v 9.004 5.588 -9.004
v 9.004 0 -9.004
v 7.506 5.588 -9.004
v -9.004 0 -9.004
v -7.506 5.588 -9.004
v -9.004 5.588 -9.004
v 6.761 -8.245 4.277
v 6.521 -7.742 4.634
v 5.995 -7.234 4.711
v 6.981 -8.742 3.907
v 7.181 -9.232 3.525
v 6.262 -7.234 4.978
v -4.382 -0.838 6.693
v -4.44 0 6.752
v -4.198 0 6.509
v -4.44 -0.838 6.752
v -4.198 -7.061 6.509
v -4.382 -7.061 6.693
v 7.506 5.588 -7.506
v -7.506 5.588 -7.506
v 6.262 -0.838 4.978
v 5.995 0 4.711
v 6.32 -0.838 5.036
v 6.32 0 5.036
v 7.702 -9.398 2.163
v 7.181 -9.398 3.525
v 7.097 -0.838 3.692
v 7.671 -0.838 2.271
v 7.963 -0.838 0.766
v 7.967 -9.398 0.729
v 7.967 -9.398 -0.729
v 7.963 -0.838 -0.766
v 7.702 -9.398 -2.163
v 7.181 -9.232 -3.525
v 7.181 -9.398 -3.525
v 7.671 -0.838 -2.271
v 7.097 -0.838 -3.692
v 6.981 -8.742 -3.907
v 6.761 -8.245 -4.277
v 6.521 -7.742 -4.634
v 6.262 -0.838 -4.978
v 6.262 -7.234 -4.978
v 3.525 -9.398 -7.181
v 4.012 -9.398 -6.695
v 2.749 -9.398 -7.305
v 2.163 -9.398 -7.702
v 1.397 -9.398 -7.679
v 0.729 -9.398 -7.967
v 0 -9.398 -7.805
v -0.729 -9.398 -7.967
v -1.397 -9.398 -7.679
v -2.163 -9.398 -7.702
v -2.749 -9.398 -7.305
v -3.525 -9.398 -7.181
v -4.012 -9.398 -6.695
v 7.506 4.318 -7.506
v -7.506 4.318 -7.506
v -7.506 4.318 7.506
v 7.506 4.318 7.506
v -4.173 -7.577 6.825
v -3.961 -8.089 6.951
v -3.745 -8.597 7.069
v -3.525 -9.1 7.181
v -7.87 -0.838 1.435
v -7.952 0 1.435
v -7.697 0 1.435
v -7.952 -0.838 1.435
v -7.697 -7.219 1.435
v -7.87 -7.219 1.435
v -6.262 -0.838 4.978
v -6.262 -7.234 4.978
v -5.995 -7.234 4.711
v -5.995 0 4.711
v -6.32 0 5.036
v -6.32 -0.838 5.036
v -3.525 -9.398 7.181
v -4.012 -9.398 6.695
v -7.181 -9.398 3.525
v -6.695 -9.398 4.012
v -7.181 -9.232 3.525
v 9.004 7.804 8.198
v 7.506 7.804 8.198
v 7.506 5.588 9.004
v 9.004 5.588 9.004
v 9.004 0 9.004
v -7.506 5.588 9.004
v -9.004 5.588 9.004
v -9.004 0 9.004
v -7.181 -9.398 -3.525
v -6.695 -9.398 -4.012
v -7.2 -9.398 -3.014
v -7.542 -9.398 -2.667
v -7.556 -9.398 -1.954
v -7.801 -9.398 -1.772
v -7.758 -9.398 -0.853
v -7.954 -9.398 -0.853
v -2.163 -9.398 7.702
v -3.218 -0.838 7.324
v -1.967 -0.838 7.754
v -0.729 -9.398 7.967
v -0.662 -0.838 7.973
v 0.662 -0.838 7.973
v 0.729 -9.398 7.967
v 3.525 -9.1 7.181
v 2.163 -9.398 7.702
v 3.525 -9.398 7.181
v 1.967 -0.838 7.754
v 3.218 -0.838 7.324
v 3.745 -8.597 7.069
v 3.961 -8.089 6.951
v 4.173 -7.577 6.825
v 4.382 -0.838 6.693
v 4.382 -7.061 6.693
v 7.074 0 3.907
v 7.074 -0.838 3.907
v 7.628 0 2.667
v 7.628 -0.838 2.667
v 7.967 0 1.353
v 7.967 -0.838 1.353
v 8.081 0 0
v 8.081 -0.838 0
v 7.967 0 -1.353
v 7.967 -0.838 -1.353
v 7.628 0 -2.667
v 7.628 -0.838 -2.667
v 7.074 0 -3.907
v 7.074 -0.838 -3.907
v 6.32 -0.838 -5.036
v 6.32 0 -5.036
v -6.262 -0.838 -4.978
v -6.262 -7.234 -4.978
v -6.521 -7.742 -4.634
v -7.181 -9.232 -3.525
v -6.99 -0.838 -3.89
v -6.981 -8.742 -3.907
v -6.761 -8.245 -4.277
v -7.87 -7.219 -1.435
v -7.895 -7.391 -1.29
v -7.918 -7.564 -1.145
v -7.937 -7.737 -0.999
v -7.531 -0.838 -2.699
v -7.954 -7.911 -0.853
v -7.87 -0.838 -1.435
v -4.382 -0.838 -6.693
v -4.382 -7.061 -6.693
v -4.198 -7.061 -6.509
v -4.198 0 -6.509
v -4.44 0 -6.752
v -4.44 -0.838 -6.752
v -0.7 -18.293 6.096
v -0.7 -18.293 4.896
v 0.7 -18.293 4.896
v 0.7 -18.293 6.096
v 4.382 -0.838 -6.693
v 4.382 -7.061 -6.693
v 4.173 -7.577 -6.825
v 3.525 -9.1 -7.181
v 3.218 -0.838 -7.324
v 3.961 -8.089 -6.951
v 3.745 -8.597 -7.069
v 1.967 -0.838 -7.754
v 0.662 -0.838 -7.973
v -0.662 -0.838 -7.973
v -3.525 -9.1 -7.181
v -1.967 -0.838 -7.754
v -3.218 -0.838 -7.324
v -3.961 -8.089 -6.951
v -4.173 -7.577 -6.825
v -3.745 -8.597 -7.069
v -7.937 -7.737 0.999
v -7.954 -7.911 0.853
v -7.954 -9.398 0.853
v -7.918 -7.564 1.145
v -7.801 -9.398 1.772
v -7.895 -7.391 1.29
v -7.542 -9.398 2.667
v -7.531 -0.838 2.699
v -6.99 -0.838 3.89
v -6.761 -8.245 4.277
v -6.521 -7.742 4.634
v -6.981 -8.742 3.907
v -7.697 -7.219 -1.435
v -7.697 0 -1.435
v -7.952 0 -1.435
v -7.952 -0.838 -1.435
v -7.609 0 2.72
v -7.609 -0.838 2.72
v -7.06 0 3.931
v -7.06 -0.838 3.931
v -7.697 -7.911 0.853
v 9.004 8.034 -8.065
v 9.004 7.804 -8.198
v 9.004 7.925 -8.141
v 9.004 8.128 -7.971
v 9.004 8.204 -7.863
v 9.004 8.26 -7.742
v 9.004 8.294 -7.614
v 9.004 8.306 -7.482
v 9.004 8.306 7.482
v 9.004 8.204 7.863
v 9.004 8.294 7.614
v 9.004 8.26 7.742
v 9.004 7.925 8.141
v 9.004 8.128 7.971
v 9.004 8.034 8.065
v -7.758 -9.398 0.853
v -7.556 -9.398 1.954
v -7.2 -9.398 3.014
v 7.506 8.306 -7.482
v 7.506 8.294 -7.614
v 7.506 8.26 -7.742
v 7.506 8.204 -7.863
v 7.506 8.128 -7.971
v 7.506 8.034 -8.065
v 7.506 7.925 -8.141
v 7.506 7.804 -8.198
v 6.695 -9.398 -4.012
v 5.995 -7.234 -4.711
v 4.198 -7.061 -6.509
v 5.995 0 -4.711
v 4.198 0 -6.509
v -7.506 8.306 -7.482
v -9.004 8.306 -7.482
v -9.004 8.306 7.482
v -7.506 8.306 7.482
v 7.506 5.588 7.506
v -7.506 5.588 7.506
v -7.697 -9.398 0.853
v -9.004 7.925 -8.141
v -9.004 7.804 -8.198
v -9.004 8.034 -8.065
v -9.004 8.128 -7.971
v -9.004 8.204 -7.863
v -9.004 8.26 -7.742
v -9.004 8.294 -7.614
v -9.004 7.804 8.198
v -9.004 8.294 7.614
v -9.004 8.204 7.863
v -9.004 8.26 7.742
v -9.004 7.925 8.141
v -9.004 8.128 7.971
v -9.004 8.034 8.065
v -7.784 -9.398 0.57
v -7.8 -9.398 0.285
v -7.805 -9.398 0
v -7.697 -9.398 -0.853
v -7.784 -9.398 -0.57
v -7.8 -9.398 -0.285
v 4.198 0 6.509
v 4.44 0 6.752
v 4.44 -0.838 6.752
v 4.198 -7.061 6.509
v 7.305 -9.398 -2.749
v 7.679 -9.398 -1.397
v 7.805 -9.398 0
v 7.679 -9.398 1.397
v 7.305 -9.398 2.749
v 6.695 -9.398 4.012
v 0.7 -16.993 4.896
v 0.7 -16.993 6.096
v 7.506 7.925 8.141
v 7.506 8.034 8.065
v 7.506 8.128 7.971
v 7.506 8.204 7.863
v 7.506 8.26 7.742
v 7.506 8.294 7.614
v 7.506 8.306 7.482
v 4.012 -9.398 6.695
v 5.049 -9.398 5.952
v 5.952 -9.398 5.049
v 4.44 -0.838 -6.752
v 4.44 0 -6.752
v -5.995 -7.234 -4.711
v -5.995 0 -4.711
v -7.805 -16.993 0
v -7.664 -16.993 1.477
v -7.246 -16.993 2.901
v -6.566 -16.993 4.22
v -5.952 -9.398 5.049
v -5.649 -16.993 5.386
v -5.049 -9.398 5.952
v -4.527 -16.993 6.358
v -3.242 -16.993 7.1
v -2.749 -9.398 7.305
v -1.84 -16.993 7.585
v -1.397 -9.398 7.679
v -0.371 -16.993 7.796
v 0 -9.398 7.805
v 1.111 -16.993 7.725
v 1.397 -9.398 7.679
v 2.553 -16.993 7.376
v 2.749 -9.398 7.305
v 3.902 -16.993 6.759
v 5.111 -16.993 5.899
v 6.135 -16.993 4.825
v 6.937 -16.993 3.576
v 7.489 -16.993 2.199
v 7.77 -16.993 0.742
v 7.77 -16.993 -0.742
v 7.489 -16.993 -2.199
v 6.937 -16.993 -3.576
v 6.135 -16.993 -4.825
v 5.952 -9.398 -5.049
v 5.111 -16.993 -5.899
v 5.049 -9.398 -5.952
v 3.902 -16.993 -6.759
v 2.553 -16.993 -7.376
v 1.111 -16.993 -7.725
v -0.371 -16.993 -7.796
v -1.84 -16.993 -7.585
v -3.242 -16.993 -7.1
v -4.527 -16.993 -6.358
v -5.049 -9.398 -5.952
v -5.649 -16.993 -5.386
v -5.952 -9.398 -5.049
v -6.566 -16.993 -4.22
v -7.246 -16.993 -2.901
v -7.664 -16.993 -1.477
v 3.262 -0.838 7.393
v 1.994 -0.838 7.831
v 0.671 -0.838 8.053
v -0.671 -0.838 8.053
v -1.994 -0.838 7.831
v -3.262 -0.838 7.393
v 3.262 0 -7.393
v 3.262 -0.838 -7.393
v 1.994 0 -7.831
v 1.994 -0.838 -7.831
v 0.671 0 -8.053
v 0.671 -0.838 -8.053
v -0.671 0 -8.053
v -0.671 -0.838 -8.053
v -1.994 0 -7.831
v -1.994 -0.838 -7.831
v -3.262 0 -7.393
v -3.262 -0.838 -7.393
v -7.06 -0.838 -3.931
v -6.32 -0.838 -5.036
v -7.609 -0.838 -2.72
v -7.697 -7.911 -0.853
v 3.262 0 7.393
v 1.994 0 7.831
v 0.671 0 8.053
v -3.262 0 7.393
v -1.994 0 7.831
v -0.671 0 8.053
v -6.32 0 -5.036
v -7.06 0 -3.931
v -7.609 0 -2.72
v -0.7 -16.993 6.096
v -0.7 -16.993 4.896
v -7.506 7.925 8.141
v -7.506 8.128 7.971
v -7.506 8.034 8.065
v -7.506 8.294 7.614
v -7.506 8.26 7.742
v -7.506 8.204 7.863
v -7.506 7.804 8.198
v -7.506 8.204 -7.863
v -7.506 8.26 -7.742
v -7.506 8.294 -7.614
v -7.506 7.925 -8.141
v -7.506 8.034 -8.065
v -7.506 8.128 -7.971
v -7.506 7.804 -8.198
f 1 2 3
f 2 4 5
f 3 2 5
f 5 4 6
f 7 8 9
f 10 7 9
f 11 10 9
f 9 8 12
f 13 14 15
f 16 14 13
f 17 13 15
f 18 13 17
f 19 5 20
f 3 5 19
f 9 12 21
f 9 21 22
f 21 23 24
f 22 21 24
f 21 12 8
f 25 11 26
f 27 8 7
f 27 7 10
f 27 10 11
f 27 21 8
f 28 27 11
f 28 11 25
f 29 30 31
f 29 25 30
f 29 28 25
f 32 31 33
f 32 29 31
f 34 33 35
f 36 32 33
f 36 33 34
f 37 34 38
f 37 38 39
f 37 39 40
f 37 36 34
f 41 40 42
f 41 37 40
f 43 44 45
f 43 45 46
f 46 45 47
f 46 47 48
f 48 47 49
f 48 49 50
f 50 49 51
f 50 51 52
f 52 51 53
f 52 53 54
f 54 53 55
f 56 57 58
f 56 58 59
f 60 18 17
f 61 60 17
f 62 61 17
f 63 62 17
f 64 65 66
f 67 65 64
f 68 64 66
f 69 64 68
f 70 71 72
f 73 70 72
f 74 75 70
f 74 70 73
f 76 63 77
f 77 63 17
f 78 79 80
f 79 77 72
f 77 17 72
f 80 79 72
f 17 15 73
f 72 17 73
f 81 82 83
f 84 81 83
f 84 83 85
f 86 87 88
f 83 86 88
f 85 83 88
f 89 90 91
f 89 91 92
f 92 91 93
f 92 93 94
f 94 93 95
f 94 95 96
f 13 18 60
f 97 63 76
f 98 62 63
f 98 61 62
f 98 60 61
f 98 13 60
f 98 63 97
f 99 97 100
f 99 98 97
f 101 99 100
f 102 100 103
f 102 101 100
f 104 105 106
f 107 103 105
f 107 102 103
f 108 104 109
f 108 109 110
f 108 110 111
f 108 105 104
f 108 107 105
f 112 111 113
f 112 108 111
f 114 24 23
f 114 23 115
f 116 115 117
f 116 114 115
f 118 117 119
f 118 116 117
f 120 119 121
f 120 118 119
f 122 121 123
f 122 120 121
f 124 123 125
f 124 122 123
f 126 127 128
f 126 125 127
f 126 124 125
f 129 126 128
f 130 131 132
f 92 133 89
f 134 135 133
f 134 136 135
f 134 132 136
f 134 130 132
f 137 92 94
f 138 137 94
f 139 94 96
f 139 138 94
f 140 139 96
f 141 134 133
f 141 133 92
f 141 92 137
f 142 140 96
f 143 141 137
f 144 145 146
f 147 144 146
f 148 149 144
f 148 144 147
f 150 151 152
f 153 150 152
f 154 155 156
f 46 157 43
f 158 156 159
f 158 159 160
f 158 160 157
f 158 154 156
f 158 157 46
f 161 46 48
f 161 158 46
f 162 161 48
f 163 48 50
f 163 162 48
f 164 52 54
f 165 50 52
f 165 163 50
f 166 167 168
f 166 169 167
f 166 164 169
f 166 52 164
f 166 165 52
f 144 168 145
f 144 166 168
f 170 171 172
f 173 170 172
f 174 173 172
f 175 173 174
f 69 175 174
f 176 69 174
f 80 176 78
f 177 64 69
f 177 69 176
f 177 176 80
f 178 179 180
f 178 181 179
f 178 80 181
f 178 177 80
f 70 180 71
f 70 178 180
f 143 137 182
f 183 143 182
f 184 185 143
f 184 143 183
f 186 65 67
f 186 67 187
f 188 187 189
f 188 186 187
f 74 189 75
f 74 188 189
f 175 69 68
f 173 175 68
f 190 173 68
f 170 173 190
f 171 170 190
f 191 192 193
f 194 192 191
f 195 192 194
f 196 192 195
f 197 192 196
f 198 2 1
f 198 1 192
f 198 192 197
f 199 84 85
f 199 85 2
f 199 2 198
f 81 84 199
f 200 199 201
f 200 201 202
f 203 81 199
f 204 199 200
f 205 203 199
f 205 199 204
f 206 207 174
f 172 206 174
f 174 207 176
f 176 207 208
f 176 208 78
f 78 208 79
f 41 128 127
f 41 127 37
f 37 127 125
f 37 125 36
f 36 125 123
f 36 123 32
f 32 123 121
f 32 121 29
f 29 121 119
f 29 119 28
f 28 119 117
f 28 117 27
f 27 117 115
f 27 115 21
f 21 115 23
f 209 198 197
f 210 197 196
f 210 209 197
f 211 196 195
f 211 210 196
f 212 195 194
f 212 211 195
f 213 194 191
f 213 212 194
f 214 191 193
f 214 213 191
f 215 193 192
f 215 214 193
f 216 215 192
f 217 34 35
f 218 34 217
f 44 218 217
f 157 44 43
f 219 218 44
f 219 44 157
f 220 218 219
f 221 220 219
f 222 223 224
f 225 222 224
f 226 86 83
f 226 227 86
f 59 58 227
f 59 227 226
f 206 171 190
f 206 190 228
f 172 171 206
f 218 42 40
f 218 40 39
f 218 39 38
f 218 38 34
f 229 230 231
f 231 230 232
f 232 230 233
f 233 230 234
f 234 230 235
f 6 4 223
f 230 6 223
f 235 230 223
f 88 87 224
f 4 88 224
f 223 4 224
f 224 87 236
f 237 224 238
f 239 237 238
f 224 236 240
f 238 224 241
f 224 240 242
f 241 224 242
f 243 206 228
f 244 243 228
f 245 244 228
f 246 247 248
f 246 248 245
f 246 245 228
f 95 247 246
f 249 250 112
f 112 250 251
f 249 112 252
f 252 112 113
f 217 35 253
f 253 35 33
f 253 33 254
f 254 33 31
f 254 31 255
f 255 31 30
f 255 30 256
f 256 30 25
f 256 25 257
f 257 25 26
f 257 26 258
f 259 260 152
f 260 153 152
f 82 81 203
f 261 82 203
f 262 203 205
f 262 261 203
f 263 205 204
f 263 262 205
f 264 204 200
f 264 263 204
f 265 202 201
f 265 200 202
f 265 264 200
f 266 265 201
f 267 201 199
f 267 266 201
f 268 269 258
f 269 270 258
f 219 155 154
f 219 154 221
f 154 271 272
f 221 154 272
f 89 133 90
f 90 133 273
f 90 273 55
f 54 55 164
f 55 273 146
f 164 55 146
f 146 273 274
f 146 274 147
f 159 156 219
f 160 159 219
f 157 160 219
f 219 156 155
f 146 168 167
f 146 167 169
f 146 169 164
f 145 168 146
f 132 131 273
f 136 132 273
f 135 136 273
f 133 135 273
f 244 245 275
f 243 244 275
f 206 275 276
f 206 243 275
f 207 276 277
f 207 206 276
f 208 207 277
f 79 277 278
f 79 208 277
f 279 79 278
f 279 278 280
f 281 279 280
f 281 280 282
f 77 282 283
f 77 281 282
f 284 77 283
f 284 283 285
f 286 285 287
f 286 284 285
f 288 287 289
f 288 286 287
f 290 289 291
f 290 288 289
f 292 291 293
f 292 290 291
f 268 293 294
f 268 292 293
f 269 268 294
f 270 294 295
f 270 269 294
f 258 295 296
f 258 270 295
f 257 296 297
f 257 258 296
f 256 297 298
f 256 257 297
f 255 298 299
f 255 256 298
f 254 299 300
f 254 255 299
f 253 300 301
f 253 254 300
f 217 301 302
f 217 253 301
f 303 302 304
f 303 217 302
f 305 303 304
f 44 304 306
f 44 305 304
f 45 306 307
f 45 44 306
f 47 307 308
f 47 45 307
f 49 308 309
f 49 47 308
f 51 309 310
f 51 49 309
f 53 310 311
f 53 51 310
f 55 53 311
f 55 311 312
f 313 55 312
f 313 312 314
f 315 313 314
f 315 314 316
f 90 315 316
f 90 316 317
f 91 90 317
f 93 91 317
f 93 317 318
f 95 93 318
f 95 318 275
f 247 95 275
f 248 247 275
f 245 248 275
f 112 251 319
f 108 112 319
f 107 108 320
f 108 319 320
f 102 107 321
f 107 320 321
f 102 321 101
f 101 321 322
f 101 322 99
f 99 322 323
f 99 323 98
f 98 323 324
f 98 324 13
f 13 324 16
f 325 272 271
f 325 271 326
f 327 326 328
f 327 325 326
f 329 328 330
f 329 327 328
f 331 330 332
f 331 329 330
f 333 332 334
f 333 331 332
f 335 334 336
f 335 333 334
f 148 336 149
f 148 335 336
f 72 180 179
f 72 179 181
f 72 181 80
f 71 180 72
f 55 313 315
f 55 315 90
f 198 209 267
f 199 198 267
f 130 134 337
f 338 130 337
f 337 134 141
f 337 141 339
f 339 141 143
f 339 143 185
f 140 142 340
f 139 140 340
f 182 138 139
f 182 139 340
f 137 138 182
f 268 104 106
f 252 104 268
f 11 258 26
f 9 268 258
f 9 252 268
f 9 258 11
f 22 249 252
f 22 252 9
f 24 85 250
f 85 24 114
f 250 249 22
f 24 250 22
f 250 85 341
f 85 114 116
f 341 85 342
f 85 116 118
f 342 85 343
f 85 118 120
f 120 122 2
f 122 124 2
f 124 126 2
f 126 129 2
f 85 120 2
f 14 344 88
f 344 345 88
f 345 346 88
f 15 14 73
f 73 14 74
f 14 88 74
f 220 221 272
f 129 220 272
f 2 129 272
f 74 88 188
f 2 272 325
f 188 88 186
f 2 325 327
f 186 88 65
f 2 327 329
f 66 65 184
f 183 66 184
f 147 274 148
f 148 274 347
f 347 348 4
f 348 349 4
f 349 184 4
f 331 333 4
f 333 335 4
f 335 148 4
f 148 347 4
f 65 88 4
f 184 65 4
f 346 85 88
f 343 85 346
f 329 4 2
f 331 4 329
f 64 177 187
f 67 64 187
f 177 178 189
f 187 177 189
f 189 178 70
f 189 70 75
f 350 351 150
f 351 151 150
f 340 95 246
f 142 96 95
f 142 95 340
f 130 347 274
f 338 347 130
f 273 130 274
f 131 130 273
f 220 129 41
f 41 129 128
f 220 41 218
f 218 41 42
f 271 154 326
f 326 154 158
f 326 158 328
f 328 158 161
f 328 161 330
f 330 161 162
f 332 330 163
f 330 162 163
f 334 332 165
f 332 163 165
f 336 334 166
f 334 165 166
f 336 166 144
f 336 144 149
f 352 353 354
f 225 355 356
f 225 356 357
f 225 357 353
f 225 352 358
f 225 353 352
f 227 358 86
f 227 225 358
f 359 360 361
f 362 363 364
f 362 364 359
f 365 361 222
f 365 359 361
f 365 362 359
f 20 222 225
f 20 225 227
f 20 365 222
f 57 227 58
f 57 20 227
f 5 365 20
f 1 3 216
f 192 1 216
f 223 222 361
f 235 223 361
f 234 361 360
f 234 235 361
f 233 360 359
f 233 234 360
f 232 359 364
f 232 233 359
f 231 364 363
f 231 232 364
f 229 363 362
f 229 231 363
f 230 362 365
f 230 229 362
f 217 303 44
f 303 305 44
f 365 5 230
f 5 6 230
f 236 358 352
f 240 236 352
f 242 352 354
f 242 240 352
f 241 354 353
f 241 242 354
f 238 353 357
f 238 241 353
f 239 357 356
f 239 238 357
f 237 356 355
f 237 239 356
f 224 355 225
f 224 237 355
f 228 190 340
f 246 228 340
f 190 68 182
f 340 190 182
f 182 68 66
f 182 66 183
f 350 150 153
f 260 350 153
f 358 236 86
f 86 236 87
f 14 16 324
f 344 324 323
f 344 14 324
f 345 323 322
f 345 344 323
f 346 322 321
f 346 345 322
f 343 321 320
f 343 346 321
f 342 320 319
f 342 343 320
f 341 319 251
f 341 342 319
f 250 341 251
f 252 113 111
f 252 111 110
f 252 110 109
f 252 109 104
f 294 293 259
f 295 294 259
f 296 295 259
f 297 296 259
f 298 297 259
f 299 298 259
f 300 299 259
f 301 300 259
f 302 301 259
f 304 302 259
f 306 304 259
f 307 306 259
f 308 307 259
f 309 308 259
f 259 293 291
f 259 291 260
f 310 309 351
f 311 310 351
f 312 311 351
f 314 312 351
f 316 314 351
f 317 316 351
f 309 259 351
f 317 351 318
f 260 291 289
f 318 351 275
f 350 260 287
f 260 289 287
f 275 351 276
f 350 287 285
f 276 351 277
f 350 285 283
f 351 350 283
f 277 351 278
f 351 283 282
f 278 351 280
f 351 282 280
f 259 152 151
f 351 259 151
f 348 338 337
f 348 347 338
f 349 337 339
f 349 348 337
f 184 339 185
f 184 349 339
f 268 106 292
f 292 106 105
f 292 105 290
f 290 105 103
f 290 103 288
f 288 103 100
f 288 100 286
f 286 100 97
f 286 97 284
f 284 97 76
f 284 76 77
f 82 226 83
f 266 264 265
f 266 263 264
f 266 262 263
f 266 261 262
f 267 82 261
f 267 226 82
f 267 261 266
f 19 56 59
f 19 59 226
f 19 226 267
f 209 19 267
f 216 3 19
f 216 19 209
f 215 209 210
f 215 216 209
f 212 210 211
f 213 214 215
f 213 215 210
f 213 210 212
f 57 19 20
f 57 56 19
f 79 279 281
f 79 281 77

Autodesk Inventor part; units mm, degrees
sketch "Sketch_1" plane through (0, 0, 0) normal (0, 0, 1) x (1, 0, 0)
  line L0 (0, 0) -> (0, -9.398)
  line L1 (0, -9.398) -> (-8, -9.398)
  line L2 (-8, -9.398) -> (-8, -0.8382)
  line L3 (-8, -0.8382) -> (-8.0808, -0.8382)
  line L4 (-8.0808, -0.8382) -> (-8.0808, 0)
  line L5 (-8.0808, 0) -> (0, 0)
  line L6 (0, 0) -> (0, -9.398)
revolve "Revolution1" add sketch "Sketch_1" angle 360 about axis through (0, 0, 0) along (0, 1, 0)
thread "Thread1" size "M16x2" class "6g" standard "ISO Metric profile" full length
sketch "Sketch_15" plane through (0, 0, 0) normal (0, 0, 1) x (1, 0, 0)
  line L0 (0, -9.398) -> (0, -16.9926)
  line L1 (0, -16.9926) -> (-7.8049, -16.9926)
  line L2 (-7.8049, -16.9926) -> (-7.8049, -9.398)
  line L3 (-7.8049, -9.398) -> (0, -9.398)
  line L4 (0, -9.398) -> (0, -16.9926)
revolve "Revolution2" add sketch "Sketch_15" angle 360 about axis through (0, -9.398, 0) along (0, 1, 0)
sketch "Sketch_7" plane through (-5.714, 0, 5.714) normal (0.7071, 0, -0.7071) x (-0.7071, 0, -0.7071)
  line L0 (-2.7242, -9.398) -> (2.7242, -9.398)
  line L1 (2.7242, -9.398) -> (0.9081, -7.2337)
  line L2 (0.9081, -7.2337) -> (0.9081, 0)
  line L3 (0.9081, 0) -> (-1.6345, 0)
  line L4 (-1.6345, 0) -> (-1.6345, -7.0612)
  line L5 (-1.6345, -7.0612) -> (-2.7242, -9.398)
extrude "Extrusion1" cut sketch "Sketch_7" along normal blind 0.508
sketch "Sketch_9" plane through (5.714, 0, 5.714) normal (0.7071, 0, 0.7071) x (0.7071, 0, -0.7071)
  line L0 (-2.7242, -9.398) -> (2.7242, -9.398)
  line L1 (2.7242, -9.398) -> (0.9081, -7.2337)
  line L2 (0.9081, -7.2337) -> (0.9081, 0)
  line L3 (0.9081, 0) -> (-1.6345, 0)
  line L4 (-1.6345, 0) -> (-1.6345, -7.0612)
  line L5 (-1.6345, -7.0612) -> (-2.7242, -9.398)
extrude "Extrusion2" cut sketch "Sketch_9" against normal blind 0.508
sketch "Sketch_8" plane through (5.714, 0, -5.714) normal (0.7071, 0, -0.7071) x (-0.7071, 0, -0.7071)
  line L0 (-2.7242, -9.398) -> (2.7242, -9.398)
  line L1 (2.7242, -9.398) -> (1.6345, -7.0612)
  line L2 (1.6345, -7.0612) -> (1.6345, 0)
  line L3 (1.6345, 0) -> (-0.9081, 0)
  line L4 (-0.9081, 0) -> (-0.9081, -7.2337)
  line L5 (-0.9081, -7.2337) -> (-2.7242, -9.398)
extrude "Extrusion3" cut sketch "Sketch_8" against normal blind 0.508
sketch "Sketch_10" plane through (-5.714, 0, -5.714) normal (0.7071, 0, 0.7071) x (0.7071, 0, -0.7071)
  line L0 (-2.7242, -9.398) -> (2.7242, -9.398)
  line L1 (2.7242, -9.398) -> (1.6345, -7.0612)
  line L2 (1.6345, -7.0612) -> (1.6345, 0)
  line L3 (1.6345, 0) -> (-0.9081, 0)
  line L4 (-0.9081, 0) -> (-0.9081, -7.2337)
  line L5 (-0.9081, -7.2337) -> (-2.7242, -9.398)
extrude "Extrusion4" cut sketch "Sketch_10" along normal blind 0.508
sketch "Sketch_14" plane through (-8.2051, 0, 0) normal (1, 0, 0) x (0, 0, -1)
  line L0 (-1.4346, -7.2187) -> (-0.8534, -7.9113)
  line L1 (-0.8534, -7.9113) -> (-0.8534, -9.398)
  line L2 (-0.8534, -9.398) -> (0.8534, -9.398)
  line L3 (0.8534, -9.398) -> (0.8534, -7.9113)
  line L4 (0.8534, -7.9113) -> (1.4346, -7.2187)
  line L5 (1.4346, -7.2187) -> (1.4346, 0)
  line L6 (1.4346, 0) -> (-1.4346, 0)
  line L7 (-1.4346, 0) -> (-1.4346, -7.2187)
extrude "Extrusion5" cut sketch "Sketch_14" along normal blind 0.508
sketch "Sketch_20" plane through (0, 0, 0) normal (1, 0, 0) x (0, 1, 0)
  line L0 (0, 9.0043) -> (0, -9.0043)
  line L1 (0, -9.0043) -> (5.588, -9.0043)
  line L2 (5.588, -9.0043) -> (7.8044, -8.1976)
  arc A0 (7.8044, -8.1976) -> (8.3058, -7.4815) centre (7.5438, -7.4815) ccw
  line L3 (8.3058, -7.4815) -> (8.3058, 7.4815)
  arc A1 (8.3058, 7.4815) -> (7.8044, 8.1976) centre (7.5438, 7.4815) ccw
  line L4 (7.8044, 8.1976) -> (5.588, 9.0043)
  line L5 (5.588, 9.0043) -> (0, 9.0043)
extrude "Extrusion6" add sketch "Sketch_20" along normal mid plane 18.0086
sketch "Sketch_19" plane through (0, 0, 0) normal (0, 0, 1) x (1, 0, 0)
  line L0 (-7.5057, 5.588) -> (7.5057, 5.588)
  line L1 (7.5057, 5.588) -> (7.5057, 9.5758)
  line L2 (7.5057, 9.5758) -> (-7.5057, 9.5758)
  line L3 (-7.5057, 9.5758) -> (-7.5057, 5.588)
extrude "Extrusion7" cut sketch "Sketch_19" along normal mid plane 30.0228
sketch "Sketch_18" plane through (0, 4.318, 0) normal (0, 1, 0) x (1, 0, 0)
  line L0 (-7.5057, 7.5057) -> (-7.5057, -7.5057)
  line L1 (-7.5057, -7.5057) -> (7.5057, -7.5057)
  line L2 (7.5057, -7.5057) -> (7.5057, 7.5057)
  line L3 (7.5057, 7.5057) -> (-7.5057, 7.5057)
extrude "Extrusion8" cut sketch "Sketch_18" along normal blind 8.3058
sketch "Sketch_2" plane through (0, -16.9926, 0) normal (0, 1, 0) x (1, 0, 0)
  line L0 (-0.7, -6.096) -> (0.7, -6.096)
  line L1 (0.7, -6.096) -> (0.7, -4.896)
  line L2 (0.7, -4.896) -> (-0.7, -4.896)
  line L3 (-0.7, -4.896) -> (-0.7, -6.096)
extrude "Extrusion9" add sketch "Sketch_2" along normal mid plane 2.6
ref_plane "body_to_cap_XY" through (0, 4.318, 0) normal (0, 1, 0) x (1, 0, 0)
ref_plane "body_to_cap_YZ" through (0, 4.318, 0) normal (1, 0, 0) x (0, 0, -1)
ref_plane "body_to_cap_ZX" through (0, 4.318, 0) normal (0, 0, -1) x (0, 1, 0)
ref_plane "body_to_metal_XY" through (0, -8.7173, 0) normal (0, 1, 0) x (1, 0, 0)
ref_plane "body_to_metal_YZ" through (0, -8.7173, 0) normal (1, 0, 0) x (0, 0, -1)
ref_plane "body_to_metal_ZX" through (0, -8.7173, 0) normal (0, 0, -1) x (0, 1, 0)
ref_plane "body_to_nut_XY" through (0, 0, 0) normal (0, 1, 0) x (1, 0, 0)
ref_plane "body_to_nut_YZ" through (0, 0, 0) normal (1, 0, 0) x (0, 0, -1)
ref_plane "body_to_nut_ZX" through (0, 0, 0) normal (0, 0, -1) x (0, 1, 0)
properties part number "YB16SKW01-BBni_body"
